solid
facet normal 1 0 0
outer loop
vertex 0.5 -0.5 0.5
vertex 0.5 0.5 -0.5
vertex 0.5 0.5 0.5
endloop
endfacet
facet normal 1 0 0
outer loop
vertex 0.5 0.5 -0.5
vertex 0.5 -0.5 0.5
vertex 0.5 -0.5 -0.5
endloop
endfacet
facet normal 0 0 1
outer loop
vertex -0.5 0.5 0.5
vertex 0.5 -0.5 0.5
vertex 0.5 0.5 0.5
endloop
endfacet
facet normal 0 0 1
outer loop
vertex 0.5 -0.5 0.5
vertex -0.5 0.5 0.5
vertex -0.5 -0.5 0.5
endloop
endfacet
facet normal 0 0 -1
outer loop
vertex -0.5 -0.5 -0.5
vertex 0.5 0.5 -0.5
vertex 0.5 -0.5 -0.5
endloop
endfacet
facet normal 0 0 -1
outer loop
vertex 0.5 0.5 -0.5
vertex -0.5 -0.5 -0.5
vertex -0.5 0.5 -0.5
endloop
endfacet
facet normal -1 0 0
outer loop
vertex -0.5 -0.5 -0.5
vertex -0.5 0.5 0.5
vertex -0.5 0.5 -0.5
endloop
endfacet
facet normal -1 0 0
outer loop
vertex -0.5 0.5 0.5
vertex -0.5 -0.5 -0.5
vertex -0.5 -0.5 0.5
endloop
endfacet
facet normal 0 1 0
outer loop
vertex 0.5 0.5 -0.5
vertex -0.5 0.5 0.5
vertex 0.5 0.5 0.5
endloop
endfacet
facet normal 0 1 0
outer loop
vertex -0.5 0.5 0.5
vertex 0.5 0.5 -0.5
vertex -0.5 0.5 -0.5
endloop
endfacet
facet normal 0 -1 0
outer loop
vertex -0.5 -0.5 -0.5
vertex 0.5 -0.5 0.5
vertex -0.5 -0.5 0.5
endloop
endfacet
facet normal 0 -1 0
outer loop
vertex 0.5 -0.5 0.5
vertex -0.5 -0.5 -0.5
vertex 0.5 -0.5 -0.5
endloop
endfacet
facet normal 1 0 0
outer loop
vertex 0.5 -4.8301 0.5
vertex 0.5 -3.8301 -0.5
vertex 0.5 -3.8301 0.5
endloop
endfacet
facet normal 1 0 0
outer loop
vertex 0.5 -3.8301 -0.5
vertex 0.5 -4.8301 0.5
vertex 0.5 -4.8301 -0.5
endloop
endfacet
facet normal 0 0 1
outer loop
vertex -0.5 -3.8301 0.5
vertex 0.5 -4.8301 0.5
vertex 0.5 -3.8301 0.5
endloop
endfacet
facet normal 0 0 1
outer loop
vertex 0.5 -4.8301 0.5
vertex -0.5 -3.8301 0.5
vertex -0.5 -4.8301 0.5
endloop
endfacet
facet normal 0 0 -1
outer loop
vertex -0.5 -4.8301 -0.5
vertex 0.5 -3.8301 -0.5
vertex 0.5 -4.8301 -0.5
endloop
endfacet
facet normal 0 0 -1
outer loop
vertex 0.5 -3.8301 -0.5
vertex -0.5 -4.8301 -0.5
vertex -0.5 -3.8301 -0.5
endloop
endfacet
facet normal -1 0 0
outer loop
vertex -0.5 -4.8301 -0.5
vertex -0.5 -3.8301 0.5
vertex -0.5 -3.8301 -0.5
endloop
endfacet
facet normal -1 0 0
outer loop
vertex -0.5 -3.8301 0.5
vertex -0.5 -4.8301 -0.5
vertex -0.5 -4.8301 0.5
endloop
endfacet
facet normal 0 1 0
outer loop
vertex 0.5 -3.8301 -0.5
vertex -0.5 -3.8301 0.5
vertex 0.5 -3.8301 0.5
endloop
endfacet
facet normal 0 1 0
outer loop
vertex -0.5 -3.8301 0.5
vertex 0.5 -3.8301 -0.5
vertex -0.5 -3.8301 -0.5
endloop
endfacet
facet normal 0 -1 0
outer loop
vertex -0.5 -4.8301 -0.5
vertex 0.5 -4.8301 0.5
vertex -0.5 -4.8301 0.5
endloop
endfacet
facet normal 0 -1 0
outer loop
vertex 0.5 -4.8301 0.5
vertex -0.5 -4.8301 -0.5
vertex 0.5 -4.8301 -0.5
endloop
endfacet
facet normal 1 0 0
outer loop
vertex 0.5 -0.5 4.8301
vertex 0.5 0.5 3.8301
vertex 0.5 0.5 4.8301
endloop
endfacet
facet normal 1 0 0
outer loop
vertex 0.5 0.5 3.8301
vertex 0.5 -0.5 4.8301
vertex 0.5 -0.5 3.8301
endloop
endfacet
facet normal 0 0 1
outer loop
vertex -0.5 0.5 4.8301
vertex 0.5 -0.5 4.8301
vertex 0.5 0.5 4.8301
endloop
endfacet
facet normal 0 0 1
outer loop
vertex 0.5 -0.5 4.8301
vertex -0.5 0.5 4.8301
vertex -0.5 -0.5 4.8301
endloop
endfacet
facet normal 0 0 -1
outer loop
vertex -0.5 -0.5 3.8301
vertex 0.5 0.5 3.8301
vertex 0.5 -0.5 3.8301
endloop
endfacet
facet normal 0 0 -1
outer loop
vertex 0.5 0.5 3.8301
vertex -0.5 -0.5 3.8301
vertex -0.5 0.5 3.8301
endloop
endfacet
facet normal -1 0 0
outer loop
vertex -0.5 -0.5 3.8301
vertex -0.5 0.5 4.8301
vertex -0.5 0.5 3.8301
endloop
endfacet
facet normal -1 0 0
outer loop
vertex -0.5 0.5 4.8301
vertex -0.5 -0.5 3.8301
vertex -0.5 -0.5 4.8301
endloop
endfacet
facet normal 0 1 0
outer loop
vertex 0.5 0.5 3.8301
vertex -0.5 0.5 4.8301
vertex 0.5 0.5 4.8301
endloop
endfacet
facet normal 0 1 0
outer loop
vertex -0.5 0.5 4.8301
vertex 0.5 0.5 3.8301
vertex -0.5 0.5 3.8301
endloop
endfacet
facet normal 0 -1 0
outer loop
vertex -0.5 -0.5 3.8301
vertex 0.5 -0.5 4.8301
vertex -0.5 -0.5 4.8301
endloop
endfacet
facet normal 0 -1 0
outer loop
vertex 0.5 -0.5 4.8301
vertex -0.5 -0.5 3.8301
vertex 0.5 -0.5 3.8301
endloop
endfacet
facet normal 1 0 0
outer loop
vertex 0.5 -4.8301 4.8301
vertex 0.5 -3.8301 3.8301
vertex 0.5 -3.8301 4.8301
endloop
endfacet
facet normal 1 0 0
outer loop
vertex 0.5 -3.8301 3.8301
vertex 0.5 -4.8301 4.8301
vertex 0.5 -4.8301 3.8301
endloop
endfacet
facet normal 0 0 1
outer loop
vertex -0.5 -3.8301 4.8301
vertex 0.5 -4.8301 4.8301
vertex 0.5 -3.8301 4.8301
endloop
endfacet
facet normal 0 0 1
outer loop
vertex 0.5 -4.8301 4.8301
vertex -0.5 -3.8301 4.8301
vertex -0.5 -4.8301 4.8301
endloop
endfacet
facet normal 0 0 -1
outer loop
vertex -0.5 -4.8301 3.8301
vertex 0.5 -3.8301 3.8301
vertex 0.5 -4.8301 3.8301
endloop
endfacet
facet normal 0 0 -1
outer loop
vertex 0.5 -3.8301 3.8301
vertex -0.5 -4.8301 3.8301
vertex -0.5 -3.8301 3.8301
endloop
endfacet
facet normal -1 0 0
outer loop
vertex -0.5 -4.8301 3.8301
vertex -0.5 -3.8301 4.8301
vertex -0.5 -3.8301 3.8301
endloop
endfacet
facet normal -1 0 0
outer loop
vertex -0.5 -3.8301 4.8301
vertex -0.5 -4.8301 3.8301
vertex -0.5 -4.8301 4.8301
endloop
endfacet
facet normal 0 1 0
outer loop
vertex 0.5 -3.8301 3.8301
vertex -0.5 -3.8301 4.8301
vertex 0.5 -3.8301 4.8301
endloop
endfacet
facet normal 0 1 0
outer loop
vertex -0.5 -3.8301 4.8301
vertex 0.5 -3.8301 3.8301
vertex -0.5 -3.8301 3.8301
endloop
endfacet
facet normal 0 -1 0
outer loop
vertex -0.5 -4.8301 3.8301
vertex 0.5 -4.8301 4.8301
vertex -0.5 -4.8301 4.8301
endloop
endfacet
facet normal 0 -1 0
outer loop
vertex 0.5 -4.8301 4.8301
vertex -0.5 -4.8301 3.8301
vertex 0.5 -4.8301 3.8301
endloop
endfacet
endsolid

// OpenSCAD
$vpr=[45,0,$t*360];
$vpt=[0,0,0];

color([1,1,1])
cube([1,1,1], center=true);
r=sin($t*360)*5;
g=sin($t*360-120)*5;
b=sin($t*360-240)*5;


//echo(cos($t*360)*5)
translate([r,0,0])
color([1,0,0])
cube([1,1,1], center=true);

translate([0,g,0])
color([0,1,0])
cube([1,1,1], center=true);

translate([0,0,b])
color([0,0,1])
cube([1,1,1], center=true);

translate([r,0,b])
color([1,0,1])
cube([1,1,1], center=true);

translate([0,g,b])
color([0,1,1])
cube([1,1,1], center=true);

translate([r,g,0])
color([1,1,0])
cube([1,1,1], center=true);
